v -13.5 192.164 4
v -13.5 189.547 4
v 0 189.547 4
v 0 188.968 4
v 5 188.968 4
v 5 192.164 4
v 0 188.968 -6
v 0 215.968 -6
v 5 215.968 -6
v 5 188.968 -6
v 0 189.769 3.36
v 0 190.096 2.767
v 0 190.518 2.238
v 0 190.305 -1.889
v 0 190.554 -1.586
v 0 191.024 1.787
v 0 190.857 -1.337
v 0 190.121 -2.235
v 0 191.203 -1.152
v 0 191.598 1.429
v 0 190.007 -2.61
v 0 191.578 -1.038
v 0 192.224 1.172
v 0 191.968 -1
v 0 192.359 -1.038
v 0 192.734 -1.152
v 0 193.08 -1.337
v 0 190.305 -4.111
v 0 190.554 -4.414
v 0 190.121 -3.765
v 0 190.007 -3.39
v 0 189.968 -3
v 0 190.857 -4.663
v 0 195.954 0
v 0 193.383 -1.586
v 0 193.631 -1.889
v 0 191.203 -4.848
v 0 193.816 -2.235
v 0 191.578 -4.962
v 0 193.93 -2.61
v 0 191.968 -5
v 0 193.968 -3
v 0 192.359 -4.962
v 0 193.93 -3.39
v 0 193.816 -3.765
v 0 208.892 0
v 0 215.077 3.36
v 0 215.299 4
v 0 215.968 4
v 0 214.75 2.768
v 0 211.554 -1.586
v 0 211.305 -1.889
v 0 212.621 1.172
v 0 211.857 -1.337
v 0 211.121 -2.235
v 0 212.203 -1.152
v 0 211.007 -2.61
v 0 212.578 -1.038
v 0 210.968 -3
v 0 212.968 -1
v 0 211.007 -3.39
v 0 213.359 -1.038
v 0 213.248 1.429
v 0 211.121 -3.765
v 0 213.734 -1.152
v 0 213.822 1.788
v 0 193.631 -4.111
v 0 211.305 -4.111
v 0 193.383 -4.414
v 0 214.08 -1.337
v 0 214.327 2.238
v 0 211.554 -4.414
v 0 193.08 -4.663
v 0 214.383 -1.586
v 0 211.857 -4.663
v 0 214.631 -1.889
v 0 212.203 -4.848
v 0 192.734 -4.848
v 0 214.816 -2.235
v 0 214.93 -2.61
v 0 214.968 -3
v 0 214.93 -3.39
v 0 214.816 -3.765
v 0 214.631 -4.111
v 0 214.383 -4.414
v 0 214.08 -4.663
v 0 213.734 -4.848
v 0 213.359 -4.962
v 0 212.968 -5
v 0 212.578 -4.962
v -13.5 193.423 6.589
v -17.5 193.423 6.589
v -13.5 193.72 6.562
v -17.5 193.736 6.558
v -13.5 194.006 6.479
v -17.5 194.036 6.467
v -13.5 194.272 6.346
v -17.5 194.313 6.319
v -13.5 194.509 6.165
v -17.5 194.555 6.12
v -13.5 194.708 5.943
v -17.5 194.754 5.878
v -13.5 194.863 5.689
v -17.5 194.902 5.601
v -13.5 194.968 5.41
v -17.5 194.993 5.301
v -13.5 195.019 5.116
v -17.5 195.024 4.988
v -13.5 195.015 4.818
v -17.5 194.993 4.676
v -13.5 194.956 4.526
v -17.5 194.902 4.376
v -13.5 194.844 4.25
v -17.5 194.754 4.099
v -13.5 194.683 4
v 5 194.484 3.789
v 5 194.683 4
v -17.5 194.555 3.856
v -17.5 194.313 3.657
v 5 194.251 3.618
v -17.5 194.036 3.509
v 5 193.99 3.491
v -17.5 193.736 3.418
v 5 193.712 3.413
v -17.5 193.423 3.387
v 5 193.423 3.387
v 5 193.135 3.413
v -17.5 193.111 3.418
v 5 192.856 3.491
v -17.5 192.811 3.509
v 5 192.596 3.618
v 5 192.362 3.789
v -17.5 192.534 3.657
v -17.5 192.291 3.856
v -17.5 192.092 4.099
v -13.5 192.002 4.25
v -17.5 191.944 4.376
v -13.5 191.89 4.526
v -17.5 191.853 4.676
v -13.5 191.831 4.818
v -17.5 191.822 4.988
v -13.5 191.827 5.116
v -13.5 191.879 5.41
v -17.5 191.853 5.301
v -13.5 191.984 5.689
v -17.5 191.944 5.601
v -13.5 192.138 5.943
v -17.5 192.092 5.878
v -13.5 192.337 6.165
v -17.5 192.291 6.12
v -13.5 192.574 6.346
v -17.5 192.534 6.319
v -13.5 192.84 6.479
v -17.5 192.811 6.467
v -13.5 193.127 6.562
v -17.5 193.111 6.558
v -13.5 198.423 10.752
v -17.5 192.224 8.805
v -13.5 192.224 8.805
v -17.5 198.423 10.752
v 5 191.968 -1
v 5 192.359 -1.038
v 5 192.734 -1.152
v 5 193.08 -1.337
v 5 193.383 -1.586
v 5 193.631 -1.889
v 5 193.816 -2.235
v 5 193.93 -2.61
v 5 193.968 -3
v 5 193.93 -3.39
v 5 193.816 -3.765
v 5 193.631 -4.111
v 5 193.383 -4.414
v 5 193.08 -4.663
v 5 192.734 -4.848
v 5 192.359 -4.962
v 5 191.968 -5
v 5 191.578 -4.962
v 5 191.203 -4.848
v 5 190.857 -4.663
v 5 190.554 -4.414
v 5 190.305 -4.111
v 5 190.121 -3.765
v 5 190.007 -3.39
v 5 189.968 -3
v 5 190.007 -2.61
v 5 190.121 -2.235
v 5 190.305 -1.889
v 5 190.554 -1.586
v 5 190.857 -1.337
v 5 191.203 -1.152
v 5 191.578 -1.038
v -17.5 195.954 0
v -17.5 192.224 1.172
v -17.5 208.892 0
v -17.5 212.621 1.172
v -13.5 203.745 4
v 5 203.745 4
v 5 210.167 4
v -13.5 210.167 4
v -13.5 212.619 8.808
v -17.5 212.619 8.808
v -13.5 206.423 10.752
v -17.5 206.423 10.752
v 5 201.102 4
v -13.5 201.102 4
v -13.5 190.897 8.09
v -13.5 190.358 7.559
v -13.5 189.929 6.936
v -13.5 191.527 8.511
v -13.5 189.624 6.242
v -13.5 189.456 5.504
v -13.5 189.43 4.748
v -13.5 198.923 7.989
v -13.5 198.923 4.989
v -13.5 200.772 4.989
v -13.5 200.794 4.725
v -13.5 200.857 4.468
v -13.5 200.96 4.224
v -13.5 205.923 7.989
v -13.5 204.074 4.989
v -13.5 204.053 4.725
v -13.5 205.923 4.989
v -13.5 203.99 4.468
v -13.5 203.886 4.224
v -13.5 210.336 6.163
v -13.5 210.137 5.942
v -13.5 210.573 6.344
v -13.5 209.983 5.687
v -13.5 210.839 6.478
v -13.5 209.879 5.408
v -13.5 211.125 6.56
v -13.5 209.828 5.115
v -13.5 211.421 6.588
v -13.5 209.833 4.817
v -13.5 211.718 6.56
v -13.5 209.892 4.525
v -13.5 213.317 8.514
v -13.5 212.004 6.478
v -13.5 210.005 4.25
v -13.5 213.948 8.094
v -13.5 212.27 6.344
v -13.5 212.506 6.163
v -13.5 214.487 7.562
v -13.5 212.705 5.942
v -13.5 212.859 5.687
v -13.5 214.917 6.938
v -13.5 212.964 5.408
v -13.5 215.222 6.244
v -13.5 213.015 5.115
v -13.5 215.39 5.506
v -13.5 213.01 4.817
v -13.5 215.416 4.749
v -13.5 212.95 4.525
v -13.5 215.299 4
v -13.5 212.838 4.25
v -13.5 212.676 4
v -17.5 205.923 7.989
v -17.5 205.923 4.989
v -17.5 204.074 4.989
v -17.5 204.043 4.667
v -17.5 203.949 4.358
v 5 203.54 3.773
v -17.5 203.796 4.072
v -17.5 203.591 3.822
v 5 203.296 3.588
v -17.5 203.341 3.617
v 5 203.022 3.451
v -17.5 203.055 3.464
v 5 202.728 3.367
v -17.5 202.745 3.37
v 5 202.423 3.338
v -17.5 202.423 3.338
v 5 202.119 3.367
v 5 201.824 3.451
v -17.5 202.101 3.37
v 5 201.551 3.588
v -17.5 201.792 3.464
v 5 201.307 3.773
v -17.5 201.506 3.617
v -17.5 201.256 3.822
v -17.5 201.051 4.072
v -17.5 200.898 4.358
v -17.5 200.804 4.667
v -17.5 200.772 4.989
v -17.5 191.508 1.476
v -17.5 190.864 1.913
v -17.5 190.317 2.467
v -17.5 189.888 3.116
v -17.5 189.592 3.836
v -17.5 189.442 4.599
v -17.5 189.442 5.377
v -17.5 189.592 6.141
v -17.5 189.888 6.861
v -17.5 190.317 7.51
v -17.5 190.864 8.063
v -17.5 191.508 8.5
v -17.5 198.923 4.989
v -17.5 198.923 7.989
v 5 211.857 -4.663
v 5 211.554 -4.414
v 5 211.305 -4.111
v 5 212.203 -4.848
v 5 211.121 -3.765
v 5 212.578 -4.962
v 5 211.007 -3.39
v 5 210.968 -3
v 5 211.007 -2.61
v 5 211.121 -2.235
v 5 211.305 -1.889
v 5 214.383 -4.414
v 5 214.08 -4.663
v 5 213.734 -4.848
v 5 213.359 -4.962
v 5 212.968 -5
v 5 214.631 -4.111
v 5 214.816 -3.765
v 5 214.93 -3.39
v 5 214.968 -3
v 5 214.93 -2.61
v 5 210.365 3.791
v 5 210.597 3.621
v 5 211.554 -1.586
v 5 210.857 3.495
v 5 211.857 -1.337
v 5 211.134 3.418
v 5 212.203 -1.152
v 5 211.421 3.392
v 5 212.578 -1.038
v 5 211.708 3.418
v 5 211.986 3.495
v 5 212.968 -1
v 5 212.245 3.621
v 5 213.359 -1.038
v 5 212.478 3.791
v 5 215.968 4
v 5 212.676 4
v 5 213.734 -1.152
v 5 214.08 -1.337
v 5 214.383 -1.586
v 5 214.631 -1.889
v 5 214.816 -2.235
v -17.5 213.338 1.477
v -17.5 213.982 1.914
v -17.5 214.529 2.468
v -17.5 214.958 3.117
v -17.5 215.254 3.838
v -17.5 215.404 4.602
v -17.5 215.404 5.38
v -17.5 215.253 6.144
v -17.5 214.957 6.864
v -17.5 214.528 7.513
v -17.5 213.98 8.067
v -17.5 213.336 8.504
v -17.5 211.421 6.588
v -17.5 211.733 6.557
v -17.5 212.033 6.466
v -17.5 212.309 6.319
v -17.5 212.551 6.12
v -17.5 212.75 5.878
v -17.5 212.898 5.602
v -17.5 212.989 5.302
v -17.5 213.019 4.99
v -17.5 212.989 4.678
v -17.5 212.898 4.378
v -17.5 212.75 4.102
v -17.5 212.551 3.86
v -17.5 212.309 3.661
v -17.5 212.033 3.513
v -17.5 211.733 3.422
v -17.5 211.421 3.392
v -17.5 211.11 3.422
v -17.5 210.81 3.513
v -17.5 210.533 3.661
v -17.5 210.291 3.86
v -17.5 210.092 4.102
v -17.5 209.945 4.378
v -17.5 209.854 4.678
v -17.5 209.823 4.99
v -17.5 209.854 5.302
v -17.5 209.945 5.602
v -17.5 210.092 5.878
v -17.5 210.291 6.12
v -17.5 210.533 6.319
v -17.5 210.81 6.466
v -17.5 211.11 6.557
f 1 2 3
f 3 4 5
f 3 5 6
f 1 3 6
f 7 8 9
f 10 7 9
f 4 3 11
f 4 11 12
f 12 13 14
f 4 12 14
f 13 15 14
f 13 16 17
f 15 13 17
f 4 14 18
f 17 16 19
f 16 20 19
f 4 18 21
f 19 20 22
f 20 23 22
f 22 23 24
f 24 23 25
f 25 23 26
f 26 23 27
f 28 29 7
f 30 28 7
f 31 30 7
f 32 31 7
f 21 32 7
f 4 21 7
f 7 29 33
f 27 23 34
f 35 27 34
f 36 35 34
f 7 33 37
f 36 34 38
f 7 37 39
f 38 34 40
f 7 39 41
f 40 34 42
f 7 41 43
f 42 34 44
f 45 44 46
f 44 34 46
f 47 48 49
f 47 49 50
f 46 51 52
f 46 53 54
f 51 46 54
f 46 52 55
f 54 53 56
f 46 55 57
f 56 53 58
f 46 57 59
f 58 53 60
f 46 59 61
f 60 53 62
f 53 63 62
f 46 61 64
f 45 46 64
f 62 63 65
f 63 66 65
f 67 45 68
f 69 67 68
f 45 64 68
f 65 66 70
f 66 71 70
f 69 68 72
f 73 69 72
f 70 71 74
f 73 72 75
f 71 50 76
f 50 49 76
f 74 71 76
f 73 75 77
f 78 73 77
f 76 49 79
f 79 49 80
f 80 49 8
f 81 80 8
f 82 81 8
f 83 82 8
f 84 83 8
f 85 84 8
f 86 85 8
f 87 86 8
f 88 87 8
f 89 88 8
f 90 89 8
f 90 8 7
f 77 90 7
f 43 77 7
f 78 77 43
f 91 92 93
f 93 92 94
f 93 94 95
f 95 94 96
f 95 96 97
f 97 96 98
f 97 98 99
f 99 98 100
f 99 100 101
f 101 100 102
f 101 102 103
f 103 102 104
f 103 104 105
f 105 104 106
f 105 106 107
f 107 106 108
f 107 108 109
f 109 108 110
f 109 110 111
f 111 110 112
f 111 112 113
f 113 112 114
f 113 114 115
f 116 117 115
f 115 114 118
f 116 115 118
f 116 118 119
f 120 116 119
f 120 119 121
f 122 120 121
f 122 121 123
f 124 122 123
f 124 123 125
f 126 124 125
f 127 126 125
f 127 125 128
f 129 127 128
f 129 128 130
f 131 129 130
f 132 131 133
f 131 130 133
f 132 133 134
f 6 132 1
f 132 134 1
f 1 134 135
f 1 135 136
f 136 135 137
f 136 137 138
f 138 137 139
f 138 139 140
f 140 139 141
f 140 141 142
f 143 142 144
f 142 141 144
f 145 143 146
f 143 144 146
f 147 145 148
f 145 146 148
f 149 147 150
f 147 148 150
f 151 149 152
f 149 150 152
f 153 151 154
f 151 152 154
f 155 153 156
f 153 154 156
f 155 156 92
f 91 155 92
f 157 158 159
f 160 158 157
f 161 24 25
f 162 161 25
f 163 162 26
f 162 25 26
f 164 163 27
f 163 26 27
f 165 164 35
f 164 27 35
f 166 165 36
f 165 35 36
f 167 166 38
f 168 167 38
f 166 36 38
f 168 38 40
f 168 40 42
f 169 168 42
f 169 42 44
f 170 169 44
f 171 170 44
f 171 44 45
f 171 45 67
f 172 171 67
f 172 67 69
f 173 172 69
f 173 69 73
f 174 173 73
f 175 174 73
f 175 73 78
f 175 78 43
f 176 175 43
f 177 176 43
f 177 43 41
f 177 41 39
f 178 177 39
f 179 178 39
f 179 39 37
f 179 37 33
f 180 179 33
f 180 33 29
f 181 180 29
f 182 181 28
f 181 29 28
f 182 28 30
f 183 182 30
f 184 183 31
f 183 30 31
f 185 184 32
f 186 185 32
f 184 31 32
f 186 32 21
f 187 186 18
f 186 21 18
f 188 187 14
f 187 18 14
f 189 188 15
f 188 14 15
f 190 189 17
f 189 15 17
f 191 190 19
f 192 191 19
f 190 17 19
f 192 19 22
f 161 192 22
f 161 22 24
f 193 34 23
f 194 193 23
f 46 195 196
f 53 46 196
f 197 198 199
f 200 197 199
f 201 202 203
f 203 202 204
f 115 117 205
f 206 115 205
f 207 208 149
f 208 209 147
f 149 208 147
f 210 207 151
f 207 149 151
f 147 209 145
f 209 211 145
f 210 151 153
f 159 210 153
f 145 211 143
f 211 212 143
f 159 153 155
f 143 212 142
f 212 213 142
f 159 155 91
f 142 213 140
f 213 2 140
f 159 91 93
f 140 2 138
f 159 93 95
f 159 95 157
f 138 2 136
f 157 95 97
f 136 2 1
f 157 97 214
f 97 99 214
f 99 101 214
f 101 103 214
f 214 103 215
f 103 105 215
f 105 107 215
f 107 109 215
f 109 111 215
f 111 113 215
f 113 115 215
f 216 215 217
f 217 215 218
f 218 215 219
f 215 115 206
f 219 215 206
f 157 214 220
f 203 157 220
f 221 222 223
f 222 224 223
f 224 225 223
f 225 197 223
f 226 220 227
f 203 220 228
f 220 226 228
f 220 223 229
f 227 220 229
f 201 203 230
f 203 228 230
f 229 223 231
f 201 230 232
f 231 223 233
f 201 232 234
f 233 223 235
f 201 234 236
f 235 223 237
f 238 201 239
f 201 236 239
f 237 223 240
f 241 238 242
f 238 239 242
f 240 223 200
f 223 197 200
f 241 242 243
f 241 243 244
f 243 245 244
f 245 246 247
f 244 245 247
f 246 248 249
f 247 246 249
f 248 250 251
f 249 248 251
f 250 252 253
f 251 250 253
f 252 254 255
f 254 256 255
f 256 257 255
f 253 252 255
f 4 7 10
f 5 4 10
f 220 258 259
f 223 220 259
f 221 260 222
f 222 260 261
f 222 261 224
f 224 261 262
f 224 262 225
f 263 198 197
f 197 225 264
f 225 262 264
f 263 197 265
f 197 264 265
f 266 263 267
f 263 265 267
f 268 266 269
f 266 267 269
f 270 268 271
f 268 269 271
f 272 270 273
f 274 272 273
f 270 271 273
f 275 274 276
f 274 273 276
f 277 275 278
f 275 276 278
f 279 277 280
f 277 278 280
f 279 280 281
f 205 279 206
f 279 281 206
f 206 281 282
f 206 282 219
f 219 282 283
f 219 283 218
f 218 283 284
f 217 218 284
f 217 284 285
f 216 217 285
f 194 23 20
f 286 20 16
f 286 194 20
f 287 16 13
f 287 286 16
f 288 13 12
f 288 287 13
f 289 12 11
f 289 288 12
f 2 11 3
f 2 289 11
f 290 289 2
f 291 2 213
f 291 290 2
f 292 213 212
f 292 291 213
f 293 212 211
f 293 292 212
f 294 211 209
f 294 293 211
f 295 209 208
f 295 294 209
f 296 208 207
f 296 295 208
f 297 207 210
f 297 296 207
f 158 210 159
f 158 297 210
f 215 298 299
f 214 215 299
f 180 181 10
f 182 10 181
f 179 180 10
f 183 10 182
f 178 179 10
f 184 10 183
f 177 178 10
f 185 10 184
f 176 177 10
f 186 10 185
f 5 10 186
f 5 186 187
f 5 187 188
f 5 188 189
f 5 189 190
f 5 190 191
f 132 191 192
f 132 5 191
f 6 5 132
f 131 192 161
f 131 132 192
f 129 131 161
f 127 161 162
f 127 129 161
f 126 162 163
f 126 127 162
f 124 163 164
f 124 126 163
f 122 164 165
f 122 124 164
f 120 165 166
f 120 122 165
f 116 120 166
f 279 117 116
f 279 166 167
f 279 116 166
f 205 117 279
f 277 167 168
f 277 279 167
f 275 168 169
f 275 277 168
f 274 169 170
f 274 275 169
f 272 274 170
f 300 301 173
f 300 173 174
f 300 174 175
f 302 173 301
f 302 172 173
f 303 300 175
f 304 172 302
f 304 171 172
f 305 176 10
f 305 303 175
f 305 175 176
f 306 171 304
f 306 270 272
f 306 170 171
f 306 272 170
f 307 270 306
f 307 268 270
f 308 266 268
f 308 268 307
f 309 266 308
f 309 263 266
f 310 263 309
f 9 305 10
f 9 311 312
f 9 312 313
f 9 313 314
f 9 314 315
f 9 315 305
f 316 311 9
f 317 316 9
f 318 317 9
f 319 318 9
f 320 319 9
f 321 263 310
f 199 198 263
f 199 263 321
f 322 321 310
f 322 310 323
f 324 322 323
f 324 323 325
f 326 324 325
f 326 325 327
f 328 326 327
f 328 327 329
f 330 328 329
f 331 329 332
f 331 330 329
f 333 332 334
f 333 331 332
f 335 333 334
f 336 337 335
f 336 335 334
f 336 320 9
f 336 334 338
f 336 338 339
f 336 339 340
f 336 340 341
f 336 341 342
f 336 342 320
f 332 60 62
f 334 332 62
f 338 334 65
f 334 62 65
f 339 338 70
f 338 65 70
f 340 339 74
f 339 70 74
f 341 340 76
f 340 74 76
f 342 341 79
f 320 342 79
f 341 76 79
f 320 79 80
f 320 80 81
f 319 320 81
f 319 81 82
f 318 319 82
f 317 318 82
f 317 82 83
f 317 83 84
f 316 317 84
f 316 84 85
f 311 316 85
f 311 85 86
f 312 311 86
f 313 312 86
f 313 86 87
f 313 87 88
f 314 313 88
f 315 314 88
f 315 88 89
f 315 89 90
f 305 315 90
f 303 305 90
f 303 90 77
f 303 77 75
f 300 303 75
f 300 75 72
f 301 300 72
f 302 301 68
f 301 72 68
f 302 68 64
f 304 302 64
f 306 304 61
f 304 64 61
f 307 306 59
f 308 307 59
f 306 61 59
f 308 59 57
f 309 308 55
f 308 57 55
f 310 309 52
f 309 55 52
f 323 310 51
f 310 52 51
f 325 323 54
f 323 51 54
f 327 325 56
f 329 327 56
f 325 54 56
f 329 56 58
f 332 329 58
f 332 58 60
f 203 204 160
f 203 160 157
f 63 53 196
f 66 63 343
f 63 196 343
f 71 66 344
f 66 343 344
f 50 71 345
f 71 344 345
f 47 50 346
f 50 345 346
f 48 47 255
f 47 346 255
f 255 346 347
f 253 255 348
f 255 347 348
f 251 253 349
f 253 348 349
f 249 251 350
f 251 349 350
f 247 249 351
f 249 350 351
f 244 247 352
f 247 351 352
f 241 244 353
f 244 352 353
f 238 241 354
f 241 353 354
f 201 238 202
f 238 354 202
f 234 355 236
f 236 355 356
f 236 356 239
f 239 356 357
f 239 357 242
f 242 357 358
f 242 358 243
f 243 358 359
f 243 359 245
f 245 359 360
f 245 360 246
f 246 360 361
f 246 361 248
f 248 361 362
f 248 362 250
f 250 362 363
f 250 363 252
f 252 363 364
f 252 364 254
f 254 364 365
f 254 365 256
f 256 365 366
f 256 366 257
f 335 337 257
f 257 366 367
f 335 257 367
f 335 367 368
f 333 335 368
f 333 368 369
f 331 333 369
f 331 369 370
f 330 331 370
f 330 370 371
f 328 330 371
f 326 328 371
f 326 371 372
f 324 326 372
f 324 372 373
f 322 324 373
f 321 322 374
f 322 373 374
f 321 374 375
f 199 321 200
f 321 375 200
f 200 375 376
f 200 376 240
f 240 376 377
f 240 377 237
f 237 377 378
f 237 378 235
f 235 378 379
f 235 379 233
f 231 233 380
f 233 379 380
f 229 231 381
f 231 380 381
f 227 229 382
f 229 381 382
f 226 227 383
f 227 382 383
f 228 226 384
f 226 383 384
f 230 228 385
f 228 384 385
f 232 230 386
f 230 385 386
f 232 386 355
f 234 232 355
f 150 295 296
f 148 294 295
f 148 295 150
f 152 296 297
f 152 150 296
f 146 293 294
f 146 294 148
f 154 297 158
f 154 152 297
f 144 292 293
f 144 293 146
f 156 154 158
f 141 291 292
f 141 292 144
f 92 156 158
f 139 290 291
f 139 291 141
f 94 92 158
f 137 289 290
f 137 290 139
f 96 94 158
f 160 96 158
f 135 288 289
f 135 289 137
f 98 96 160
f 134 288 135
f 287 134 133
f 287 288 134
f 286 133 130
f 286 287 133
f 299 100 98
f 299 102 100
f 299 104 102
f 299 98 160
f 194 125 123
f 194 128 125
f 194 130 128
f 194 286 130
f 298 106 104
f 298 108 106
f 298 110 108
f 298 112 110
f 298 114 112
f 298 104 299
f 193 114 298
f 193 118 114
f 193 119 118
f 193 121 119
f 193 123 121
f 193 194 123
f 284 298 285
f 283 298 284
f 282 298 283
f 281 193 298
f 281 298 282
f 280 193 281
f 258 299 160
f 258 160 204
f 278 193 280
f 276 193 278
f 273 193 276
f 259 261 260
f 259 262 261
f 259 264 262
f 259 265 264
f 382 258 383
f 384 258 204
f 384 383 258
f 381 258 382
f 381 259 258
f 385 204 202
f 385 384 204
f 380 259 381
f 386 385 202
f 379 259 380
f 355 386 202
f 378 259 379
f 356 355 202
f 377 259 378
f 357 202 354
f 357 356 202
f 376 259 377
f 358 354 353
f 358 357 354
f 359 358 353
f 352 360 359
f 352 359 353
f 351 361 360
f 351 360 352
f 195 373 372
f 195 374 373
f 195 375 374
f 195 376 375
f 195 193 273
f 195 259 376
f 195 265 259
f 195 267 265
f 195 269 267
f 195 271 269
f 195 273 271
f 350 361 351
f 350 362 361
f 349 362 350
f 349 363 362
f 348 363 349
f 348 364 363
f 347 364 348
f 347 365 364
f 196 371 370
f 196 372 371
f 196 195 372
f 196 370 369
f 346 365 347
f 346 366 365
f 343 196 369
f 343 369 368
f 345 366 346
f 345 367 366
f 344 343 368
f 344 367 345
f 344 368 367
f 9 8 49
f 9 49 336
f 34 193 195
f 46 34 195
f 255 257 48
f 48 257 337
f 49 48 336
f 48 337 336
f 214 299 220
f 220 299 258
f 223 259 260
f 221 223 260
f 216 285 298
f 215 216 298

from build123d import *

# Parameters (mm, degrees)
ESBO_O1_W                     = 5
ESBO_O1_H                     = 27
RESSALTO_EXTRUS_O1_DEPTH      = 4
RESSALTO_EXTRUS_O1_DEPTH_BACK = 6
ESBO_O2_W                     = 4
ESBO_O2_H                     = 27
RESSALTO_EXTRUS_O2_DEPTH      = 17.5
ESBO_O3_W                     = 4
ESBO_O3_H                     = 27
RESSALTO_EXTRUS_O3_DEPTH      = 6.75232
CORTE_EXTRUS_O1_DEPTH         = 17.5
ESBO_O5_R                     = 1.598160281
ESBO_O5_R_2                   = 1.600993429
CORTE_EXTRUS_O2_DEPTH         = 23.5
ESBO_O6_R                     = 2
CORTE_EXTRUS_O3_DEPTH         = 14


with BuildPart() as part:
    # Esboço1 → Ressalto-extrusão1 (new body, two sides)
    with BuildSketch(Plane.XY) as ressalto_extrus_o1_sk:
        with Locations((2.5, 202.468429513)):
            Rectangle(ESBO_O1_W, ESBO_O1_H)
    extrude(amount=RESSALTO_EXTRUS_O1_DEPTH)
    extrude(ressalto_extrus_o1_sk.sketch, amount=-RESSALTO_EXTRUS_O1_DEPTH_BACK)

    # Esboço2 → Ressalto-extrusão2 (add)
    with BuildSketch(Plane.ZY):
        with Locations((2, 202.468429513)):
            Rectangle(ESBO_O2_W, ESBO_O2_H)
    extrude(amount=RESSALTO_EXTRUS_O2_DEPTH)

    # Esboço3 → Ressalto-extrusão3 (add)
    with BuildSketch(Plane.XY.offset(4)):
        with Locations((-15.5, 202.468429513)):
            Rectangle(ESBO_O3_W, ESBO_O3_H)
    extrude(amount=RESSALTO_EXTRUS_O3_DEPTH)

    # Esboço4 → Corte-extrusão1 (cut)
    with BuildSketch(Plane.ZY.offset(17.5)):
        with BuildLine():
            Line((10.752320108, 206.42333876), (10.752320108, 215.968429513))
            Line((10.752320108, 215.968429513), (0, 215.968429513))
            Line((0, 215.968429513), (0, 208.891636686))
            Line((0, 208.891636686), (1.172017461, 212.62112057))
            ThreePointArc((1.172017461, 212.62112057), (4.990885368, 215.423316276), (8.808422699, 212.619308145))
            Line((8.808422699, 212.619308145), (10.752320108, 206.42333876))
        make_face()
        with BuildLine():
            Line((10.752320108, 198.42333838), (10.752320108, 188.968429513))
            Line((10.752320108, 188.968429513), (0, 188.968429513))
            Line((0, 188.968429513), (0, 195.95406786))
            Line((0, 195.95406786), (1.171653646, 192.22427259))
            ThreePointArc((1.171653646, 192.22427259), (4.988209463, 189.422715847), (8.804822441, 192.224194718))
            Line((8.804822441, 192.224194718), (10.752320108, 198.42333838))
        make_face()
    extrude(amount=-CORTE_EXTRUS_O1_DEPTH, mode=Mode.SUBTRACT)

    # Esboço5 → Corte-extrusão2 (cut, through all)
    with BuildSketch(Plane.ZY.offset(17.5)):
        with Locations((4.989935533, 211.421312021)):
            Circle(ESBO_O5_R)
        with Locations((4.988250275, 193.423193451)):
            Circle(ESBO_O5_R_2)
        with BuildLine():
            Line((4.9893193, 200.772419725), (4.9893193, 198.92333857))
            Line((4.9893193, 198.92333857), (7.9893193, 198.92333857))
            Line((7.9893193, 198.92333857), (7.9893193, 205.92333857))
            Line((7.9893193, 205.92333857), (4.9893193, 205.92333857))
            Line((4.9893193, 205.92333857), (4.9893193, 204.074257415))
            ThreePointArc((4.9893193, 204.074257415), (3.338400455, 202.42333857), (4.9893193, 200.772419725))
        make_face()
    extrude(amount=-CORTE_EXTRUS_O2_DEPTH, mode=Mode.SUBTRACT)

    # Esboço6 → Corte-extrusão3 (cut)
    with BuildSketch(Plane.ZY):
        with Locations((-3, 212.968429513)):
            Circle(ESBO_O6_R)
        with Locations((-3, 191.968429513)):
            Circle(ESBO_O6_R)
    extrude(amount=-CORTE_EXTRUS_O3_DEPTH, mode=Mode.SUBTRACT)


solid = part.part
